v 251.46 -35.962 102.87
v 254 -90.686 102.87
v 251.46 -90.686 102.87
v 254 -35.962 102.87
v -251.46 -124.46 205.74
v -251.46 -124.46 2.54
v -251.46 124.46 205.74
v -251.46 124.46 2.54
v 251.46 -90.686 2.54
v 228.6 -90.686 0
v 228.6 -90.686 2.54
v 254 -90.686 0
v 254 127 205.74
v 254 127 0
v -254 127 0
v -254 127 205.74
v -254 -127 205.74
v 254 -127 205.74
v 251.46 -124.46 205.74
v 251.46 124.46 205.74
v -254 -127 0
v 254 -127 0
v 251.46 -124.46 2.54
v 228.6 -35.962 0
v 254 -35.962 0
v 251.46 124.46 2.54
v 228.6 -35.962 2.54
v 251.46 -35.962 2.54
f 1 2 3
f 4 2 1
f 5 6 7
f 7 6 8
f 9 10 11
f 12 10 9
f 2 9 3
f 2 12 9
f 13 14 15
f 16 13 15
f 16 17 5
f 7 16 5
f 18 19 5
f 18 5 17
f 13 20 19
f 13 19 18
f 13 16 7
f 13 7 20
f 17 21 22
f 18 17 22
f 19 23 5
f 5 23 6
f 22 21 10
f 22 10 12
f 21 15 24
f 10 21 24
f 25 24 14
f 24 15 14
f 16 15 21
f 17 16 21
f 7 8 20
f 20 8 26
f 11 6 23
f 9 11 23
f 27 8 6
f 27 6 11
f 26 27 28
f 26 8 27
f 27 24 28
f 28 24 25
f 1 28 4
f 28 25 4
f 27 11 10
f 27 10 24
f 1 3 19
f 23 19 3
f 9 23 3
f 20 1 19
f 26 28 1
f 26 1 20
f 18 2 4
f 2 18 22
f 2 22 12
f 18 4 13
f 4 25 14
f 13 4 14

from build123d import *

# Parameters (mm, degrees)
F0_W     = 508
F0_H     = 254
F1_DEPTH = 2.54
F2_W     = 505.46
F2_H     = 2.54
F3_DEPTH = 203.2
F4_W     = 2.54
F4_H     = 248.92
F5_DEPTH = 203.2
F6_W     = 54.724466
F6_H     = 102.87
F7_DEPTH = 25.4


with BuildPart() as f1:
    # F0 (on Top) → F1 (new body)
    with BuildSketch(Plane.XY):
        Rectangle(F0_W, F0_H)
    extrude(amount=F1_DEPTH)

    # F2 (on face) → F3 (join)
    with BuildSketch(Plane.XY.offset(2.54)):
        Polygon((-251.46, 127), (-254, 127), (-254, -127), (-251.46, -127), (-251.46, 124.46), align=None)
        with Locations((1.27, 125.73)):
            Rectangle(F2_W, F2_H)
    extrude(amount=F3_DEPTH)

    # F4 (on face) → F5 (join)
    with BuildSketch(Plane.XY.offset(2.54)):
        Polygon((-251.46, -124.46), (-251.46, -127), (254, -127), (254, -124.46), (251.46, -124.46), align=None)
        with Locations((252.73, 0)):
            Rectangle(F4_W, F4_H)
    extrude(amount=F5_DEPTH)

    # F6 (on face) → F7 (cut)
    with BuildSketch(Plane.YZ.offset(254)):
        with Locations((-63.324029, 51.435)):
            Rectangle(F6_W, F6_H)
    extrude(amount=-F7_DEPTH, mode=Mode.SUBTRACT)


solid = f1.part
